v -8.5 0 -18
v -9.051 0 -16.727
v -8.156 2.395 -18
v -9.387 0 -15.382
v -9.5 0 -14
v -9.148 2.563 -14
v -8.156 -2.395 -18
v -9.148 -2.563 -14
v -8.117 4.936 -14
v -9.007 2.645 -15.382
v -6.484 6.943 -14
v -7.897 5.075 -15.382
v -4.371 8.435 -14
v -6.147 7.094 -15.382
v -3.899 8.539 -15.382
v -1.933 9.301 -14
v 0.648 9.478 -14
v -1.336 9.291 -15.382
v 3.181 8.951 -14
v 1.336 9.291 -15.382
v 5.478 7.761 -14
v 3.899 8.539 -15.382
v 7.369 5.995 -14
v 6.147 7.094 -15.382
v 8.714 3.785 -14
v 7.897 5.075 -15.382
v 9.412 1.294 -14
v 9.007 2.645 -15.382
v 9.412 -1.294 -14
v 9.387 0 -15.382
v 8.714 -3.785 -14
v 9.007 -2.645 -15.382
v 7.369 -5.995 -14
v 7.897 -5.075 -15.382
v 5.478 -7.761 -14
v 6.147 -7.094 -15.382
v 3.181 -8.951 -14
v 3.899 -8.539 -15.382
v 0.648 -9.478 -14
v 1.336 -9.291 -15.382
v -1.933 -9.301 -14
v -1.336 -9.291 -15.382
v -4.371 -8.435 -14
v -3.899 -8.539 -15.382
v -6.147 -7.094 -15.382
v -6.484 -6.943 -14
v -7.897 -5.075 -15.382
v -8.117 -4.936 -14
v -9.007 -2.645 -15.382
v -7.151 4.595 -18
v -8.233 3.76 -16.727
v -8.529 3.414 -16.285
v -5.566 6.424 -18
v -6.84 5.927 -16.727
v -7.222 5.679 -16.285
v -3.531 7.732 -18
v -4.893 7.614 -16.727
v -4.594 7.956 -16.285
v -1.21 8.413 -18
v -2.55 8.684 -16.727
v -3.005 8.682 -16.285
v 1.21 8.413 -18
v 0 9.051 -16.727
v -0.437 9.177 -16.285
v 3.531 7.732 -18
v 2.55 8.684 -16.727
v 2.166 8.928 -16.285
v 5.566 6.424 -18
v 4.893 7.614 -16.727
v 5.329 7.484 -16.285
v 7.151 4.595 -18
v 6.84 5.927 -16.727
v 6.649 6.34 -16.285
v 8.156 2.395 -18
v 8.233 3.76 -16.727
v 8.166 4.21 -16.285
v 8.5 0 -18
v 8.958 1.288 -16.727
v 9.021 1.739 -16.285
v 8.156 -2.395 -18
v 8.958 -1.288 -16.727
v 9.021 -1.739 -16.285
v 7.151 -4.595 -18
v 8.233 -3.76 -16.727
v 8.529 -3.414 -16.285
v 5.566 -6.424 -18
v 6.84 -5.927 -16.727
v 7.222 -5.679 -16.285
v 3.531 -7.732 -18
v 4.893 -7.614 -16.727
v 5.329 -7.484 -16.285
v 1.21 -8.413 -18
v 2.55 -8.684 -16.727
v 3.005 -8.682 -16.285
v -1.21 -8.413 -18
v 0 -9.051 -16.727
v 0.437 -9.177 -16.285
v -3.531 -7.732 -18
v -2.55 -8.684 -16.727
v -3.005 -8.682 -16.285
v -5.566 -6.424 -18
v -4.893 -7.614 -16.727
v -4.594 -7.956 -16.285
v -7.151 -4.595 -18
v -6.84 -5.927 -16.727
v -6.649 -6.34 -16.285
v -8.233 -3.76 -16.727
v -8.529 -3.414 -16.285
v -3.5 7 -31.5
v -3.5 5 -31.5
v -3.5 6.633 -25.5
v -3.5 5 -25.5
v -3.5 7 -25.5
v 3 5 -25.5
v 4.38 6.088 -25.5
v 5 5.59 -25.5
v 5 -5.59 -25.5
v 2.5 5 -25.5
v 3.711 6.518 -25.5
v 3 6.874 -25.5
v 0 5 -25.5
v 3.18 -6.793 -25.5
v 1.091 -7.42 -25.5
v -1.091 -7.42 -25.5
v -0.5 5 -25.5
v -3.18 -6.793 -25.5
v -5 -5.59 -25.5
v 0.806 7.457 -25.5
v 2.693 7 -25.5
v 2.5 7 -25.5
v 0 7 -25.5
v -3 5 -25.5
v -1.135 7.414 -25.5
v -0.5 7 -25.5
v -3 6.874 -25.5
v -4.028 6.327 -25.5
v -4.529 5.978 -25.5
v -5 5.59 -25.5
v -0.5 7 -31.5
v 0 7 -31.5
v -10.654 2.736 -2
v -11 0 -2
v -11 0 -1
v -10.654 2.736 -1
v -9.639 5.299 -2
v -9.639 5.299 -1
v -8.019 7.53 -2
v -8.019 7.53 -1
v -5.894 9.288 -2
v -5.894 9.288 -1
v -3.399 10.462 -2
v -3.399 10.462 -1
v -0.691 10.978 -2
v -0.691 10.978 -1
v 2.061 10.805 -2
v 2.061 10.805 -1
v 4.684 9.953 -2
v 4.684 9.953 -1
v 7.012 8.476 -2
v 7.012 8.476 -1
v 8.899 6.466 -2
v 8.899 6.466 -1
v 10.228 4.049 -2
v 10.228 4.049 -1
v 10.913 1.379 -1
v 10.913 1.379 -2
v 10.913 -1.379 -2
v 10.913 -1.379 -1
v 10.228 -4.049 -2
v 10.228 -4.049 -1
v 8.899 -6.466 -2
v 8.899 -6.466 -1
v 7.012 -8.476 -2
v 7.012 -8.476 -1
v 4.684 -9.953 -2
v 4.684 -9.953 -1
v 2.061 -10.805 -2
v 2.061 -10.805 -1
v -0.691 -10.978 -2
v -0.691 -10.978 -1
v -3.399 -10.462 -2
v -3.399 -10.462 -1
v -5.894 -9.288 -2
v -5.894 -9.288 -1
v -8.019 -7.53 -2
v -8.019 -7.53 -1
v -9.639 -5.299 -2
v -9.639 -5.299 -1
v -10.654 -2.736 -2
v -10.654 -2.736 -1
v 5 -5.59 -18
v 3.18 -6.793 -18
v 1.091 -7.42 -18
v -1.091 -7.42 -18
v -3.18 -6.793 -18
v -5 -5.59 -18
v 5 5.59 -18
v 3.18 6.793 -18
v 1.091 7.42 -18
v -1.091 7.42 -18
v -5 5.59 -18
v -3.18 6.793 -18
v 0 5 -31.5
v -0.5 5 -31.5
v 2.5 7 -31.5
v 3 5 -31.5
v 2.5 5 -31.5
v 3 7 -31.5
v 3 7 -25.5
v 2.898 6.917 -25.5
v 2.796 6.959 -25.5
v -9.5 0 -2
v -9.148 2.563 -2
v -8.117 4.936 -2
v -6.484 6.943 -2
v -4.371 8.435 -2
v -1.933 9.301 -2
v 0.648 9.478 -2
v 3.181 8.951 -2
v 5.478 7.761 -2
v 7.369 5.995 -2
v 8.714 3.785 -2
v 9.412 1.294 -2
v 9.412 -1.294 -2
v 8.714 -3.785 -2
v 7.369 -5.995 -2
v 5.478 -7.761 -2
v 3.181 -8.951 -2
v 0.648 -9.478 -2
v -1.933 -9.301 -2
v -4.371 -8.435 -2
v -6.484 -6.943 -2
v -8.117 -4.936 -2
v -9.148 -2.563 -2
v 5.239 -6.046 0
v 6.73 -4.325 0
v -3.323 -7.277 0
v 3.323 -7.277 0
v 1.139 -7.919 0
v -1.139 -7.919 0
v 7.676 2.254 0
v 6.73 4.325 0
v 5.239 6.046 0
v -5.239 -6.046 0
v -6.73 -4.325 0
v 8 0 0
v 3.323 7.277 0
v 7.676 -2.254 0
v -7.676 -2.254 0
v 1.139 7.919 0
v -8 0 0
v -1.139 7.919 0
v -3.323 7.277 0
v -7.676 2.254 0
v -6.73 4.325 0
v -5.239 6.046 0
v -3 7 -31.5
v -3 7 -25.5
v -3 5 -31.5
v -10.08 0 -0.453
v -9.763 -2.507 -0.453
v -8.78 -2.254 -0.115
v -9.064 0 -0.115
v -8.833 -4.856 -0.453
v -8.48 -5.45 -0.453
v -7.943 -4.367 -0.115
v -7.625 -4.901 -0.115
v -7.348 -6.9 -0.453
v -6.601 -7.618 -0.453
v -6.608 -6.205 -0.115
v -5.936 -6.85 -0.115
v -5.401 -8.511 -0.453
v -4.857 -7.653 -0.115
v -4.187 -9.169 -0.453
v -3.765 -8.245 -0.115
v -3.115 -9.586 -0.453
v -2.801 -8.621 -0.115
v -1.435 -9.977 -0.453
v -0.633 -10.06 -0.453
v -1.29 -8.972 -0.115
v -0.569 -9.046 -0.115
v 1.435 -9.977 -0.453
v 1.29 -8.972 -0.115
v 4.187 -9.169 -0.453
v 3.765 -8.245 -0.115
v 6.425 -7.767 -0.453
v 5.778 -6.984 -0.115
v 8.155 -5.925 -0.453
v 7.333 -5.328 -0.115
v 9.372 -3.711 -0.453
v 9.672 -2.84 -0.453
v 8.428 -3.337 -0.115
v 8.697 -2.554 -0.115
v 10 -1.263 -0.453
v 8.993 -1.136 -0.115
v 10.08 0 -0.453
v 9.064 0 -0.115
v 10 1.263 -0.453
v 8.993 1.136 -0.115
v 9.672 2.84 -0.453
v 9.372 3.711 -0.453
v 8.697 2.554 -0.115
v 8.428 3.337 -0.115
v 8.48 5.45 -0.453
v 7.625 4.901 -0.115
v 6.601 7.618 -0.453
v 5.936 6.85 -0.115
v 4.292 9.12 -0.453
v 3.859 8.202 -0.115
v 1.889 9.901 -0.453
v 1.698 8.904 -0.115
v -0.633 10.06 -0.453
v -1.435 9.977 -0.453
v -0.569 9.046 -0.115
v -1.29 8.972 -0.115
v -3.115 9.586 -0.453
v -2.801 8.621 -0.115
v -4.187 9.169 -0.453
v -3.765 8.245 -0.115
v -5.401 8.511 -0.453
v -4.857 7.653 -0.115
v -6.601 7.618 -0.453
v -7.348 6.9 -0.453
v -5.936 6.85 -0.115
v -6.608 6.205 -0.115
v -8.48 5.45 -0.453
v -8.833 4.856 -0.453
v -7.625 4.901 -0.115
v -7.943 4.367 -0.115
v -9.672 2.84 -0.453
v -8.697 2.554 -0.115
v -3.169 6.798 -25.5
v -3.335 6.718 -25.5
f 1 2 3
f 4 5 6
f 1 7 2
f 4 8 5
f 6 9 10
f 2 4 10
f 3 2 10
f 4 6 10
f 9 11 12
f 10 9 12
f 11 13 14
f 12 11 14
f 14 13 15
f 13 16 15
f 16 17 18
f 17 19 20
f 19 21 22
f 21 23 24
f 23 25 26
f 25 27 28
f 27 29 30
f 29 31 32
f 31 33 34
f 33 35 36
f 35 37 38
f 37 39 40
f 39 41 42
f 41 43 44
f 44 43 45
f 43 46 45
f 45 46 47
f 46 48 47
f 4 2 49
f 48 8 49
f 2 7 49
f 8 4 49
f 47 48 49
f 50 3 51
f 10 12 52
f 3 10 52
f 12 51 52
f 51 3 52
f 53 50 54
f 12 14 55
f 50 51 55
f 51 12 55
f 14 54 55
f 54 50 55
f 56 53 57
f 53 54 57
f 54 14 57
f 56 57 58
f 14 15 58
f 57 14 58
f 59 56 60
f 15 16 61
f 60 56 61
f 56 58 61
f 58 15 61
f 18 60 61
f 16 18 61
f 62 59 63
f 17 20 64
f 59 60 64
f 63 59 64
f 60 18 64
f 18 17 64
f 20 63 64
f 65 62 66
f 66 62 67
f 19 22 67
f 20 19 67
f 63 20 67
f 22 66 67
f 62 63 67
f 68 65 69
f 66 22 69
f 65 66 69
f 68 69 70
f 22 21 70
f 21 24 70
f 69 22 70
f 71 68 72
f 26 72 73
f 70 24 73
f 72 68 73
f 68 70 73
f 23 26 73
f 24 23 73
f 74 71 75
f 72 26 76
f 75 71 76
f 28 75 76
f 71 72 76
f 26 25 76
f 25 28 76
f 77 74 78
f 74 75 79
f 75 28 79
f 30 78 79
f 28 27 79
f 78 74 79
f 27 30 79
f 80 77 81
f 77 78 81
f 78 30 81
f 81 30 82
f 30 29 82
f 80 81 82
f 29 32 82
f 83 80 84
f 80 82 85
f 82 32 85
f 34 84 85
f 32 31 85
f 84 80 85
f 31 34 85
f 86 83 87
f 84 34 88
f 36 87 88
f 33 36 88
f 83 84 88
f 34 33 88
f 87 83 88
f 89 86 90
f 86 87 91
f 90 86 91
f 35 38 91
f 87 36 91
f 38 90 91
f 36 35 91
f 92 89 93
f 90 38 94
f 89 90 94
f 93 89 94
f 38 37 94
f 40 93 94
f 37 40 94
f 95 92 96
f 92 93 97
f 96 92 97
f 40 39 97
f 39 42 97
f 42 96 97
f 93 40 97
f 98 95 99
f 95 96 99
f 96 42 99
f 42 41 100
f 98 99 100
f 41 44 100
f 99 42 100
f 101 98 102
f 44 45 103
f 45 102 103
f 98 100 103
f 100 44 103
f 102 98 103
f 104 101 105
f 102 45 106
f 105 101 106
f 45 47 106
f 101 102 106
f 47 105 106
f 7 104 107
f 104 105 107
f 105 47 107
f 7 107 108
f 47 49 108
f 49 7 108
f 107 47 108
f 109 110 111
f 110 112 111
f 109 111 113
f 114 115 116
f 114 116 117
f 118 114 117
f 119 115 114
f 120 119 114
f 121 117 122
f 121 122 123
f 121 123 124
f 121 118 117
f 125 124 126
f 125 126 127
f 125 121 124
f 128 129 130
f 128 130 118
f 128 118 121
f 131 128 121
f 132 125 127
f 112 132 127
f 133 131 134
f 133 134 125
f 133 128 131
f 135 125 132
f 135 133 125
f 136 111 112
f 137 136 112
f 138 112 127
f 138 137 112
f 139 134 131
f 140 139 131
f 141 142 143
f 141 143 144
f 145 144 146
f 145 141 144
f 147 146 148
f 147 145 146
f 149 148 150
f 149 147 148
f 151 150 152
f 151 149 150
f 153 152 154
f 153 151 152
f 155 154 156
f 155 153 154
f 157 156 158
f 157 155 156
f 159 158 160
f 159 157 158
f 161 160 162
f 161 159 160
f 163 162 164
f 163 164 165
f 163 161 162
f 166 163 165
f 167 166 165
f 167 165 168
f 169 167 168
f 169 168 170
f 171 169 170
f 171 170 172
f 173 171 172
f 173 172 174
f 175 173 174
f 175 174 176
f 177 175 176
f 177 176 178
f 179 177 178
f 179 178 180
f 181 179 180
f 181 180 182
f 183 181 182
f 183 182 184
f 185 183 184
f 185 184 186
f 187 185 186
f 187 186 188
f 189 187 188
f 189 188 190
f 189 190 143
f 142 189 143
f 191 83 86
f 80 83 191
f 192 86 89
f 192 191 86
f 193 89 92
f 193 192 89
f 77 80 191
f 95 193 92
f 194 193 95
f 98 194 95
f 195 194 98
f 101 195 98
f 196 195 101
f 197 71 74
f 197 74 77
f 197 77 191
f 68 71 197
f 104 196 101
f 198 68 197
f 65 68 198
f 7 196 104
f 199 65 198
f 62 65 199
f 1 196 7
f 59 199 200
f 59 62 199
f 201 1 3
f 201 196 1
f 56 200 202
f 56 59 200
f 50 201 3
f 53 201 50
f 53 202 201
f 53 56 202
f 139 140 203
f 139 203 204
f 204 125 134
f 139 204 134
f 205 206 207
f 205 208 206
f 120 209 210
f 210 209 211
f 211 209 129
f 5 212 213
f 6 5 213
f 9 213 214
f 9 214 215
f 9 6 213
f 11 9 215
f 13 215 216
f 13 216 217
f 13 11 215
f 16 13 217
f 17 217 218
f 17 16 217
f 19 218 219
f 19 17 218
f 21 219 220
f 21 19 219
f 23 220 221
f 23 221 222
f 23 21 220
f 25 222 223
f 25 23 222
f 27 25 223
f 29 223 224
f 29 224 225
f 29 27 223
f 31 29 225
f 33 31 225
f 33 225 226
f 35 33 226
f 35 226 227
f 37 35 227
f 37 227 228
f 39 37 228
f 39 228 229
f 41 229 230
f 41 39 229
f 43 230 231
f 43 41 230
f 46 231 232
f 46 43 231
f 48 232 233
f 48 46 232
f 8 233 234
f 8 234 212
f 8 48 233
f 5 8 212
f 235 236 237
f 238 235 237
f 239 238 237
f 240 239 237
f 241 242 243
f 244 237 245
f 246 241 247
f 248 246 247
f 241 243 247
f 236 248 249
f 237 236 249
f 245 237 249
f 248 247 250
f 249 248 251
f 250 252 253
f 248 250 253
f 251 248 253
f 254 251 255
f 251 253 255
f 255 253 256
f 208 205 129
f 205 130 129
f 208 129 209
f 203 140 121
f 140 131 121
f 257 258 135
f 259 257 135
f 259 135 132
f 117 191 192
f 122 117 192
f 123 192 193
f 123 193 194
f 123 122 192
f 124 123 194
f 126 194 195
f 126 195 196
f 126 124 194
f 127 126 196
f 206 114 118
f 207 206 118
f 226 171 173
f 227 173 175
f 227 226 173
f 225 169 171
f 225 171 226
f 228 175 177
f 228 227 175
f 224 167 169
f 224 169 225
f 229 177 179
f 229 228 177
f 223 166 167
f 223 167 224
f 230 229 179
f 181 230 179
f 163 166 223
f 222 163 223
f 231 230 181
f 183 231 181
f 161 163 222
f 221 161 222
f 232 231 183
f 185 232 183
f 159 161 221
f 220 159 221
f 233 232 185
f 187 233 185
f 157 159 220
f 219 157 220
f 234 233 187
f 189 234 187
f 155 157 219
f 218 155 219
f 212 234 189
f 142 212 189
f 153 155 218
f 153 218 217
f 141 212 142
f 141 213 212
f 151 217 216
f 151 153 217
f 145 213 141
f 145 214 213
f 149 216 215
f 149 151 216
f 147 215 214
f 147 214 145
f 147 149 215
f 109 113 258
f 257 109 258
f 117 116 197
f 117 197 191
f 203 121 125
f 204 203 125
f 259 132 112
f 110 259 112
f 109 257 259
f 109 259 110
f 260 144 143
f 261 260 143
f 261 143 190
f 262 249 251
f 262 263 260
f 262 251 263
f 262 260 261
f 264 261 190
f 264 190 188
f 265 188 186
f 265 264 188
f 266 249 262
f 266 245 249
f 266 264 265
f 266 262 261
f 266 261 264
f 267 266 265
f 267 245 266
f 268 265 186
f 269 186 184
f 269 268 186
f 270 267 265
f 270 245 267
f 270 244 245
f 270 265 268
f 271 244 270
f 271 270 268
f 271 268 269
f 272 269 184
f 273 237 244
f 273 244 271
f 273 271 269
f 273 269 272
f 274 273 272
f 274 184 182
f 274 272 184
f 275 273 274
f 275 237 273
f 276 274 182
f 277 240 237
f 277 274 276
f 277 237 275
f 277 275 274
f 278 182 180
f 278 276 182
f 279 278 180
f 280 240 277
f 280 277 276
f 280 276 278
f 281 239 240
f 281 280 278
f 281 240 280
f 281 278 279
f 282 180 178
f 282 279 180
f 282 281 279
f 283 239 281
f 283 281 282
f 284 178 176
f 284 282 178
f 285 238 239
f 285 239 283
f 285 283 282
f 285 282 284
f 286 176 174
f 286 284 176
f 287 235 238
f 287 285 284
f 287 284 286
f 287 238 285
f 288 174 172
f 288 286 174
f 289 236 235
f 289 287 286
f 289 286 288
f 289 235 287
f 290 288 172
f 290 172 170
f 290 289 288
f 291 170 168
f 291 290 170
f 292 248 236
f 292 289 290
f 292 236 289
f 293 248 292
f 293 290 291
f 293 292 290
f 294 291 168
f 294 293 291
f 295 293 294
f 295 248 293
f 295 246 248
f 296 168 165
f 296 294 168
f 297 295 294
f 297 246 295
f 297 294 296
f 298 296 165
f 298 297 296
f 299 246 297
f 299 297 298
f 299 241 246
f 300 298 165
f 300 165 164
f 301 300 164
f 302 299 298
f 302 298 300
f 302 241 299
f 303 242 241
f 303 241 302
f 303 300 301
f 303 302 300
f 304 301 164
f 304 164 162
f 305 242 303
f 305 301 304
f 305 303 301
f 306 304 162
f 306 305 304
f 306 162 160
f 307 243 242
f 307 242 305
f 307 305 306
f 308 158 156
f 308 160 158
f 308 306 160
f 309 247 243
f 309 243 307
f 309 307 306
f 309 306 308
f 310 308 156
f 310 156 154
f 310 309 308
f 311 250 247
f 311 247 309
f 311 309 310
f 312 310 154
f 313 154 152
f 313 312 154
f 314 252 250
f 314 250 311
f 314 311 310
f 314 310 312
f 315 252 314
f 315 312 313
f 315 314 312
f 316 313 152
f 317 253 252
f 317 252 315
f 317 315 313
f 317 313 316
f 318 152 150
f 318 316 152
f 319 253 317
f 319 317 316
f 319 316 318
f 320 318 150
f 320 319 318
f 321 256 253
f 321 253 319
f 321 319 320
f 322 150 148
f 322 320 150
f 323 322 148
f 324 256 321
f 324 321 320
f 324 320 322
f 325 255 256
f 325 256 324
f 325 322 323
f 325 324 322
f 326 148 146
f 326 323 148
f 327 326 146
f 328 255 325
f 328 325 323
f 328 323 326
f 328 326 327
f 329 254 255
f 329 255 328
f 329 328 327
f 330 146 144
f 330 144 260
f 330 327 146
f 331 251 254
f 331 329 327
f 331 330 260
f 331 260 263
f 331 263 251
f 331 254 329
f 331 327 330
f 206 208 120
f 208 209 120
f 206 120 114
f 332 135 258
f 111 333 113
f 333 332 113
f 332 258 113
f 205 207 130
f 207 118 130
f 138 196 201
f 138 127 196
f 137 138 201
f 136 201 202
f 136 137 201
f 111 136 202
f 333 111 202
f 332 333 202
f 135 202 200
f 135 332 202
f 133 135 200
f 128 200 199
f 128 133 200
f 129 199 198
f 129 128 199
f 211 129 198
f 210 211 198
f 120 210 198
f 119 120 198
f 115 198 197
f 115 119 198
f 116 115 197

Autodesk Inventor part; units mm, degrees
ref_plane "YZ Plane" through (0, 0, 0) normal (1, 0, 0) x (0, 1, 0)
ref_plane "XZ Plane" through (0, 0, 0) normal (0, 1, 0) x (-1, 0, 0)
ref_plane "XY Plane" through (0, 0, 0) normal (0, 0, 1) x (1, 0, 0)
sketch "Skizze1" plane through (0, 0, 0) normal (0, 1, 0) x (-1, 0, 0)
  line L0 (0, 0) -> (0, -100) construction
  line L1 (0, 0) -> (8, 0)
  arc A0 (11, -1) -> (8, 0) centre (8, -5) ccw
  line L2 (11, -1) -> (11, -2)
  line L3 (11, -2) -> (9.5, -2)
  line L4 (9.5, -2) -> (9.5, -14)
  arc A1 (8.5, -18) -> (9.5, -14) centre (1, -14) ccw
  line L5 (8.5, -18) -> (7.5, -18)
  line L6 (7.5, -18) -> (7.5, -25.5)
  line L7 (7.5, -25.5) -> (0, -25.5)
  line L8 (0, 0) -> (0, -25.5)
  point P0 (10.25, -2)
  dimension "d0" = 100
  dimension "d1" = 19
  dimension "d2" = 22
  dimension "d3" = 2
  dimension "d4" = 1
  dimension "d5" = 3
  dimension "d6" = 12
  dimension "d7" = 4
  dimension "d10" = 7.5
  dimension "d26" = 7.5
  dimension "d27" = 8.5
revolve "Umdrehung1" add sketch "Skizze1" angle 360 about axis through (0, 0, 0) along (0, 0, -1)
thread "Gewinde1" size "M18x2.5" class "6g" standard "ANSI Metric M Profile" full length
sketch "Skizze2" plane through (0, 0, -25.5) normal (0, 0, -1) x (-1, 0, 0)
  circle A0 centre (0, 0) radius 7.5 projected
  line L0 (5, 5.5902) -> (-5, 5.5902)
  line L1 (-5, 5.5902) -> (-5, -5.5902)
  line L2 (-5, -5.5902) -> (5, -5.5902)
  line L3 (5, -5.5902) -> (5, 5.5902)
  point P0 (-5, 5.5902)
  dimension "d14" = 10
extrude "Extrusion1" cut sketch "Skizze2" against normal up to surface (7.5 mm away) contours A0 L3 | L1 A0
sketch "Skizze3" plane through (0, 0, -25.5) normal (0, 0, -1) x (-1, 0, 0)
  line L0 (3.5, 7) -> (3, 7)
  line L1 (3, 7) -> (3, 5)
  line L2 (3, 5) -> (3.5, 5)
  line L3 (3.5, 5) -> (3.5, 7)
  point P0 (0, 0)
  point P1 (3, 6)
  dimension "d17" = 0.5
  dimension "d18" = 2
  dimension "d19" = 5
  dimension "d20" = 3
extrude "Extrusion2" add sketch "Skizze3" along normal blind 6
pattern_linear "Rechteckige Anordnung1" count 3 spacing 3 along (1, 0, 0) of "Extrusion2"
properties part number "Druckknopf_Konsole_groß" material "Stahl, galvanisiert"
